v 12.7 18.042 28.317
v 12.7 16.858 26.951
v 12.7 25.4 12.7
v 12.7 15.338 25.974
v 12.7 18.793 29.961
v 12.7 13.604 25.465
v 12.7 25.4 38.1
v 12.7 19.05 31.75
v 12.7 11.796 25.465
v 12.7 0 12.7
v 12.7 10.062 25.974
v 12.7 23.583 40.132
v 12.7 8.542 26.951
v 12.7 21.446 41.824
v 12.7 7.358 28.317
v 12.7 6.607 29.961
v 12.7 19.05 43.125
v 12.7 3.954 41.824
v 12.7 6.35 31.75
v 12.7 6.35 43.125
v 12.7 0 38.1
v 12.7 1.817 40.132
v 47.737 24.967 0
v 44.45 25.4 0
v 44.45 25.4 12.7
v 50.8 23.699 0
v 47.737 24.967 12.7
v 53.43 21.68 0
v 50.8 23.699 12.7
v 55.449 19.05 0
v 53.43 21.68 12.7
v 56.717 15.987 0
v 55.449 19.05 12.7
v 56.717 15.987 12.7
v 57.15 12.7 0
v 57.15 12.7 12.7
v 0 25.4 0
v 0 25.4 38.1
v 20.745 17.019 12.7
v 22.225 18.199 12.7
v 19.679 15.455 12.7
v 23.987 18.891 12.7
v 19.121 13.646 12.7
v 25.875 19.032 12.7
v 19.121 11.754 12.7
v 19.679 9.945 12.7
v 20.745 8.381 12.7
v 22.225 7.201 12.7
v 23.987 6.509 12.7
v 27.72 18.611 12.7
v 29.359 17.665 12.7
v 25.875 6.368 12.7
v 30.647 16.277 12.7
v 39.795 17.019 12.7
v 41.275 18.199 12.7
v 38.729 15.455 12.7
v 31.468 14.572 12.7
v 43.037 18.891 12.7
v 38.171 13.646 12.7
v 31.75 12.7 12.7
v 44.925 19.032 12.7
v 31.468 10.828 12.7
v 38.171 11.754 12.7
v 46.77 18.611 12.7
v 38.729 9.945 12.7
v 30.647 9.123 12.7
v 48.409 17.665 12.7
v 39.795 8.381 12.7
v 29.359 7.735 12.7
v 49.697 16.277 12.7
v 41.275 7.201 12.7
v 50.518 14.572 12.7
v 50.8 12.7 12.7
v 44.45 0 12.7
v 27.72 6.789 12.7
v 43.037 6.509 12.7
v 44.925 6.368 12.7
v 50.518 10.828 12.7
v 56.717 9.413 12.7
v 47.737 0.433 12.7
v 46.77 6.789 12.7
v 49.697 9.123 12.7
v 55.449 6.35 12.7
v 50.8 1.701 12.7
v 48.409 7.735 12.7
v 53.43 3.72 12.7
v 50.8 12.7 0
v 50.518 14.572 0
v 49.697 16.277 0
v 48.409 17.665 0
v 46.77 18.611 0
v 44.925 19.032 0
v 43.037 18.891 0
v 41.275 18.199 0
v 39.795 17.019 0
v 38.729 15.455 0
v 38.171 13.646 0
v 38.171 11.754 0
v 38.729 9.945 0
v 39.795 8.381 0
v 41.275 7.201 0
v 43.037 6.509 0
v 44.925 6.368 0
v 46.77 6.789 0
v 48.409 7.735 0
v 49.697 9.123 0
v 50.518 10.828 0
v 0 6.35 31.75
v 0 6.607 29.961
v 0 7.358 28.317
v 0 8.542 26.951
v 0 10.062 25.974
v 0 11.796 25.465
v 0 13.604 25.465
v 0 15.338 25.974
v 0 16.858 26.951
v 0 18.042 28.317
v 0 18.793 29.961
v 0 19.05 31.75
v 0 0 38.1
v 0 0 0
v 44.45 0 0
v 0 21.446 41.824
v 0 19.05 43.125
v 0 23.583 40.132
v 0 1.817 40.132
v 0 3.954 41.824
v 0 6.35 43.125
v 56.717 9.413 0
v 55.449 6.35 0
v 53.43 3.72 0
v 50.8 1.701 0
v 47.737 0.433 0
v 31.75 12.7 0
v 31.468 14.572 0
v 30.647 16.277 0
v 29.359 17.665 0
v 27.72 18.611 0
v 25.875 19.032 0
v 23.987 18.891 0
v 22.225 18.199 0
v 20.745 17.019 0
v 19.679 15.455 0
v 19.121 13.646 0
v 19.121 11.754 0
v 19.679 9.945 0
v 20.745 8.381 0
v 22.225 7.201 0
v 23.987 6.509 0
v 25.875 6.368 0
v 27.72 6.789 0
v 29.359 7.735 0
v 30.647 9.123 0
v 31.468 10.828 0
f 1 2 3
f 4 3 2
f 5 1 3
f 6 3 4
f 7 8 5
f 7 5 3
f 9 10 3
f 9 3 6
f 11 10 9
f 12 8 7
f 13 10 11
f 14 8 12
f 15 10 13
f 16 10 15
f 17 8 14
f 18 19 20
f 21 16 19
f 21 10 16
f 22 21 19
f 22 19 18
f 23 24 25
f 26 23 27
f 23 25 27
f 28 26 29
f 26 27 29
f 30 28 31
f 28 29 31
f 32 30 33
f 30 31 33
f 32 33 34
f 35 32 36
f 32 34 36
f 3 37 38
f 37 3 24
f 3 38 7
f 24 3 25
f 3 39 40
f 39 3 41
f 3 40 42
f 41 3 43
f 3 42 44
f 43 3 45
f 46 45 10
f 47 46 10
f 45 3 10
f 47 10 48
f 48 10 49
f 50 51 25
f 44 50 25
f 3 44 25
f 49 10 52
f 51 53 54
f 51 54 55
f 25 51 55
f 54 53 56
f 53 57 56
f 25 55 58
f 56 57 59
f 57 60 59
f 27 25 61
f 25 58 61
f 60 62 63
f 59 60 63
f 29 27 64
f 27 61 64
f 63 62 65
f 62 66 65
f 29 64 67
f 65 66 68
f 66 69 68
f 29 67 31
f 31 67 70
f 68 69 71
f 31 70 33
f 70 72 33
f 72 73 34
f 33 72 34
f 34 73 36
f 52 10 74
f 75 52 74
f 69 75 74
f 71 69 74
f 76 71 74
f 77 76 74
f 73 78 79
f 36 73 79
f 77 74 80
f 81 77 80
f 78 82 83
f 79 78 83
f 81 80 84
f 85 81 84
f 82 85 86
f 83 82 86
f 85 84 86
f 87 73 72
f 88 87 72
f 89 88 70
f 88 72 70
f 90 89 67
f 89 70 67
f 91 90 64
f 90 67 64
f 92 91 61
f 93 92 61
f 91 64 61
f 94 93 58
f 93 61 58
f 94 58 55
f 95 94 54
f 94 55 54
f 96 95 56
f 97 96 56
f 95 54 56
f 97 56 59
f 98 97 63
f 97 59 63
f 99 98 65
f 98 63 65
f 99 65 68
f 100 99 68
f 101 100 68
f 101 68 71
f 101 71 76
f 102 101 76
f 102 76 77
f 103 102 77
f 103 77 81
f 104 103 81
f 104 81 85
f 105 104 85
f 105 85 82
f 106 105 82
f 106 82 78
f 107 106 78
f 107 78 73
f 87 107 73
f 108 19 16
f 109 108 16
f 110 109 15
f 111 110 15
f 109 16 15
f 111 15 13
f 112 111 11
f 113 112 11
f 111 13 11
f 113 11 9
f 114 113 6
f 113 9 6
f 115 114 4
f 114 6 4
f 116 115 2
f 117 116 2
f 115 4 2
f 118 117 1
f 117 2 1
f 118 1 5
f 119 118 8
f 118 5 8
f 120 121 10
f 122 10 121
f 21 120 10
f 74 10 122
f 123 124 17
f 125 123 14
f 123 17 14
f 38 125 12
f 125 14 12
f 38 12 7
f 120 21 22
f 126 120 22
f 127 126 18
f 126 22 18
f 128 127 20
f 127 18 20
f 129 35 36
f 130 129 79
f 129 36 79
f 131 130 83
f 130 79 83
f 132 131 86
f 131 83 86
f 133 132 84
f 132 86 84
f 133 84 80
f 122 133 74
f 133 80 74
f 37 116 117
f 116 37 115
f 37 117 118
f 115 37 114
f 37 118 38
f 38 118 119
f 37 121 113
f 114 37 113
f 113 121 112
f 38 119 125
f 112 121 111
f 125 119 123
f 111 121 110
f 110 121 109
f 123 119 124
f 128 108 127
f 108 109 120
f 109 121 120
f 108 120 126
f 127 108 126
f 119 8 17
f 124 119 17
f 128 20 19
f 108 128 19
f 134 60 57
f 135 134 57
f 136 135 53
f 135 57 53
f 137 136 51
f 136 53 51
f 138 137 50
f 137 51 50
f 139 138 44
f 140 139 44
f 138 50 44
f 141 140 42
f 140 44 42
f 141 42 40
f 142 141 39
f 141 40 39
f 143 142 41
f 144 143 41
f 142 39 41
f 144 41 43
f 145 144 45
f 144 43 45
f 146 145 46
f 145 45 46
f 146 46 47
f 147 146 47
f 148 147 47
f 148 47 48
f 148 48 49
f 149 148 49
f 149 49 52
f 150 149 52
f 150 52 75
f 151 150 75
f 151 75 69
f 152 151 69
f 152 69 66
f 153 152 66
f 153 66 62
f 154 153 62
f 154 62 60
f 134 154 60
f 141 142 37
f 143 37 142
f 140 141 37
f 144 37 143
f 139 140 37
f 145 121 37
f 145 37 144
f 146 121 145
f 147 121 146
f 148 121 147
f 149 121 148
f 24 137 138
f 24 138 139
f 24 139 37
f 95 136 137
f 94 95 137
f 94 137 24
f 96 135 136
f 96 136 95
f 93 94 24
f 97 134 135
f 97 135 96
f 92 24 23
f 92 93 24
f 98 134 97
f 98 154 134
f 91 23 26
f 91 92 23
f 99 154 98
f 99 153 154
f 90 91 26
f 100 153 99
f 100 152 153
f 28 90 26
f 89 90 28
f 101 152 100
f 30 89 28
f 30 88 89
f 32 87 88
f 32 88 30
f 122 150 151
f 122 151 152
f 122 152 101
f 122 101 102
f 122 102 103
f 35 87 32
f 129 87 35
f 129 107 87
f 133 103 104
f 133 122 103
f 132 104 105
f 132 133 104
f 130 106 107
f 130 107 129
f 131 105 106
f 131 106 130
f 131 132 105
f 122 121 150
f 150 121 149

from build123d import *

# Parameters (mm, degrees)
F0_W      = 63.5
F0_H      = 44.45
F1_DEPTH  = 25.4
F2_DEPTH  = 6.35
F3_W      = 44.45
F3_H      = 31.75
F4_DEPTH  = 25.4
F5_R      = 6.35
F6_DEPTH  = 25.4
F8_DEPTH  = 25.4
F10_DEPTH = 25.4


with BuildPart() as f1:
    # F0 (on Front) → F1 (new body)
    with BuildSketch(Plane.XZ):
        with Locations((31.75, 22.225)):
            Rectangle(F0_W, F0_H)
    extrude(amount=-F1_DEPTH)

    # F2 (cut): a face of the model
    f2_faces = [f1.faces().sort_by_distance(p)[0] for p in [
        (63.5, 12.7, 22.225),
    ]]
    extrude(f2_faces, amount=-F2_DEPTH, mode=Mode.SUBTRACT)

    # F3 (on face) → F4 (cut)
    with BuildSketch(Plane.XZ):
        with Locations((34.925, 28.575)):
            Rectangle(F3_W, F3_H)
    extrude(amount=-F4_DEPTH, mode=Mode.SUBTRACT)

    # F5 (on face) → F6 (cut)
    with BuildSketch(Plane.XY.offset(12.7)):
        with Locations((25.4, 12.7)):
            Circle(F5_R)
        with Locations((44.45, 12.7)):
            Circle(F5_R)
    extrude(amount=-F6_DEPTH, mode=Mode.SUBTRACT)

    # F7 (on face) → F8 (cut)
    with BuildSketch(Plane.XY.offset(12.7)):
        with BuildLine():
            ThreePointArc((44.45, 25.4), (53.4302561211, 21.6802561211), (57.15, 12.7))
            Line((57.15, 12.7), (57.15, 25.4))
            Line((57.15, 25.4), (44.45, 25.4))
        make_face()
        with BuildLine():
            ThreePointArc((57.15, 12.7), (53.4302561211, 3.7197438789), (44.45, 0))
            Line((44.45, 0), (57.15, 0))
            Line((57.15, 0), (57.15, 12.7))
        make_face()
    extrude(amount=-F8_DEPTH, mode=Mode.SUBTRACT)

    # F9 (on face) → F10 (cut)
    with BuildSketch(Plane.YZ.offset(12.7)):
        with BuildLine():
            ThreePointArc((12.7, 44.45), (15.9434155936, 44.1151377178), (19.05, 43.1246778315))
            Line((19.05, 43.1246778315), (19.05, 44.45))
            Line((19.05, 44.45), (12.7, 44.45))
        make_face()
        with BuildLine():
            Line((6.35, 44.45), (6.35, 43.1246778315))
            ThreePointArc((6.35, 43.1246778315), (9.4565844064, 44.1151377178), (12.7, 44.45))
            Line((12.7, 44.45), (6.35, 44.45))
        make_face()
        with BuildLine():
            ThreePointArc((0, 38.1), (2.8492400381, 41.0240221774), (6.35, 43.1246778315))
            Line((6.35, 43.1246778315), (6.35, 44.45))
            Line((6.35, 44.45), (0, 44.45))
            Line((0, 44.45), (0, 38.1))
        make_face()
        with BuildLine():
            ThreePointArc((6.35, 31.75), (12.7, 25.4), (19.05, 31.75))
            ThreePointArc((19.05, 31.75), (12.7, 38.1), (6.35, 31.75))
        make_face()
        with BuildLine():
            ThreePointArc((6.35, 31.75), (12.7, 38.1), (19.05, 31.75))
            Line((19.05, 31.75), (19.05, 43.1246778315))
            ThreePointArc((19.05, 43.1246778315), (15.9434155936, 44.1151377178), (12.7, 44.45))
            ThreePointArc((12.7, 44.45), (9.4565844064, 44.1151377178), (6.35, 43.1246778315))
            Line((6.35, 43.1246778315), (6.35, 31.75))
        make_face()
        with BuildLine():
            Line((19.05, 44.45), (19.05, 43.1246778315))
            ThreePointArc((19.05, 43.1246778315), (22.5507599619, 41.0240221774), (25.4, 38.1))
            Line((25.4, 38.1), (25.4, 44.45))
            Line((25.4, 44.45), (19.05, 44.45))
        make_face()
    extrude(amount=-F10_DEPTH, mode=Mode.SUBTRACT)


solid = f1.part
